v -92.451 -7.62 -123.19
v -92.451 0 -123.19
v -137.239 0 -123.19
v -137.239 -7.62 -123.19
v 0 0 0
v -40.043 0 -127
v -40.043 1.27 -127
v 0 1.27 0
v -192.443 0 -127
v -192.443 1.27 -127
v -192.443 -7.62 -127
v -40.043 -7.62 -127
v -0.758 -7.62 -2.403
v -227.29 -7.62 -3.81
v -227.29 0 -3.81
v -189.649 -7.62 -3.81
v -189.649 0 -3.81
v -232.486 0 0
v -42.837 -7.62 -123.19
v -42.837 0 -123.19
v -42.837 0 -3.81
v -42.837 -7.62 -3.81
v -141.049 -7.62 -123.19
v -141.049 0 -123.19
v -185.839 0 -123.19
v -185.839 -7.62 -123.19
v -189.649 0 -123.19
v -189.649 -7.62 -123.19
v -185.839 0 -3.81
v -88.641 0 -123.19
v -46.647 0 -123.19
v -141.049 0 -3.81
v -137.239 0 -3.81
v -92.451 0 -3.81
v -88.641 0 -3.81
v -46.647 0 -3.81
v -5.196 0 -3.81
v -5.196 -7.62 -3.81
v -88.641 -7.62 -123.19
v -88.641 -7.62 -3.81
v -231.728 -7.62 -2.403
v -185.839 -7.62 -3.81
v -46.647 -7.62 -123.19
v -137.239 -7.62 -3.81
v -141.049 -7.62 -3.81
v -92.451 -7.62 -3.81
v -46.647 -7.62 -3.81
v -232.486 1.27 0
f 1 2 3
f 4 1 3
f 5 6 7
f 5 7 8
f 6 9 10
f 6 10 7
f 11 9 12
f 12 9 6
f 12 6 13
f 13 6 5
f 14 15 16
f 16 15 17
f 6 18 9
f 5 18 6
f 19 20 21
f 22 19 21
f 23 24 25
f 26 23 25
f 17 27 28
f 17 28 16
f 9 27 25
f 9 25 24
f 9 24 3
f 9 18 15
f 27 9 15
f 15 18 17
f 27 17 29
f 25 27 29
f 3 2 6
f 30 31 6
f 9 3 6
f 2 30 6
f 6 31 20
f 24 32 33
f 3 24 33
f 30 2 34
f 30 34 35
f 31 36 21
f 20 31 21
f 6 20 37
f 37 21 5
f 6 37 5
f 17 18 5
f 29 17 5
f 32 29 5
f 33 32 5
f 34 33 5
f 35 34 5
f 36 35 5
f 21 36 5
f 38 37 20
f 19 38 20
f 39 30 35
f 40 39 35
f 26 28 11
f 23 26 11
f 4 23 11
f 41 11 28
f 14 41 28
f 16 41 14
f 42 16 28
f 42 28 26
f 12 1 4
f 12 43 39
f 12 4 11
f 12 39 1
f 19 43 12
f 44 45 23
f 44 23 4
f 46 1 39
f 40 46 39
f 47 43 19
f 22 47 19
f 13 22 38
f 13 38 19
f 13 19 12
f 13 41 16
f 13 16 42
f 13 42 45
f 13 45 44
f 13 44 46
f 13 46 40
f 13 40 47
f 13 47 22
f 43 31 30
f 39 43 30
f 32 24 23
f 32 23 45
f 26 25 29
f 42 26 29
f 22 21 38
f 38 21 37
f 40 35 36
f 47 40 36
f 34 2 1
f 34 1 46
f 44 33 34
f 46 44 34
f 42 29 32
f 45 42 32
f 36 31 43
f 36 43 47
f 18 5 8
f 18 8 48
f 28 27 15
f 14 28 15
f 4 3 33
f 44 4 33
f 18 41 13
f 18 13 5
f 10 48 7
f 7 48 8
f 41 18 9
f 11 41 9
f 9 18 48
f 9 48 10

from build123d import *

# Parameters (mm, degrees)
F0_W     = 3.81
F0_H     = 119.38
F1_DEPTH = 7.62
F3_DEPTH = 2159
F5_DEPTH = 1.27


with BuildPart() as f1:
    # F0 (on Front) → F1 (new body)
    with BuildSketch(Plane.XZ):
        Polygon((-40.042946, -127), (0, 0), (-232.485892, 0), (-192.442946, -127), align=None)
        Polygon((-42.836554, -3.81), (-5.196184, -3.81), (-42.836554, -123.19), (-46.646554, -123.19), (-88.640766, -123.19), (-92.450766, -123.19), (-137.238586, -123.19), (-141.048586, -123.19), (-185.839339, -123.19), (-189.649339, -123.19), (-227.289708, -3.81), (-189.649339, -3.81), (-185.839339, -3.81), (-141.048586, -3.81), (-137.238586, -3.81), (-92.450766, -3.81), (-88.640766, -3.81), (-46.646554, -3.81), align=None, mode=Mode.SUBTRACT)
        with Locations((-139.143586, -63.5)):
            Rectangle(F0_W, F0_H)
        with Locations((-90.545766, -63.5)):
            Rectangle(F0_W, F0_H)
        with Locations((-187.744339, -63.5)):
            Rectangle(F0_W, F0_H)
        with Locations((-44.741554, -63.5)):
            Rectangle(F0_W, F0_H)
    extrude(amount=F1_DEPTH)

    # F2 (on Right) → F3 (cut)
    with BuildSketch(Plane.YZ):
        Polygon((-12.7, -4.004295), (0, 0), (-12.7, 0), align=None)
    extrude(amount=-F3_DEPTH, mode=Mode.SUBTRACT)


with BuildPart() as f5:
    # F4 (on Front) → F5 (new body)
    with BuildSketch(Plane.XZ):
        Polygon((-40.042946, -127), (0, 0), (-232.485892, 0), (-192.442946, -127), align=None)
    extrude(amount=-F5_DEPTH)


solid = Compound([f1.part, f5.part])
